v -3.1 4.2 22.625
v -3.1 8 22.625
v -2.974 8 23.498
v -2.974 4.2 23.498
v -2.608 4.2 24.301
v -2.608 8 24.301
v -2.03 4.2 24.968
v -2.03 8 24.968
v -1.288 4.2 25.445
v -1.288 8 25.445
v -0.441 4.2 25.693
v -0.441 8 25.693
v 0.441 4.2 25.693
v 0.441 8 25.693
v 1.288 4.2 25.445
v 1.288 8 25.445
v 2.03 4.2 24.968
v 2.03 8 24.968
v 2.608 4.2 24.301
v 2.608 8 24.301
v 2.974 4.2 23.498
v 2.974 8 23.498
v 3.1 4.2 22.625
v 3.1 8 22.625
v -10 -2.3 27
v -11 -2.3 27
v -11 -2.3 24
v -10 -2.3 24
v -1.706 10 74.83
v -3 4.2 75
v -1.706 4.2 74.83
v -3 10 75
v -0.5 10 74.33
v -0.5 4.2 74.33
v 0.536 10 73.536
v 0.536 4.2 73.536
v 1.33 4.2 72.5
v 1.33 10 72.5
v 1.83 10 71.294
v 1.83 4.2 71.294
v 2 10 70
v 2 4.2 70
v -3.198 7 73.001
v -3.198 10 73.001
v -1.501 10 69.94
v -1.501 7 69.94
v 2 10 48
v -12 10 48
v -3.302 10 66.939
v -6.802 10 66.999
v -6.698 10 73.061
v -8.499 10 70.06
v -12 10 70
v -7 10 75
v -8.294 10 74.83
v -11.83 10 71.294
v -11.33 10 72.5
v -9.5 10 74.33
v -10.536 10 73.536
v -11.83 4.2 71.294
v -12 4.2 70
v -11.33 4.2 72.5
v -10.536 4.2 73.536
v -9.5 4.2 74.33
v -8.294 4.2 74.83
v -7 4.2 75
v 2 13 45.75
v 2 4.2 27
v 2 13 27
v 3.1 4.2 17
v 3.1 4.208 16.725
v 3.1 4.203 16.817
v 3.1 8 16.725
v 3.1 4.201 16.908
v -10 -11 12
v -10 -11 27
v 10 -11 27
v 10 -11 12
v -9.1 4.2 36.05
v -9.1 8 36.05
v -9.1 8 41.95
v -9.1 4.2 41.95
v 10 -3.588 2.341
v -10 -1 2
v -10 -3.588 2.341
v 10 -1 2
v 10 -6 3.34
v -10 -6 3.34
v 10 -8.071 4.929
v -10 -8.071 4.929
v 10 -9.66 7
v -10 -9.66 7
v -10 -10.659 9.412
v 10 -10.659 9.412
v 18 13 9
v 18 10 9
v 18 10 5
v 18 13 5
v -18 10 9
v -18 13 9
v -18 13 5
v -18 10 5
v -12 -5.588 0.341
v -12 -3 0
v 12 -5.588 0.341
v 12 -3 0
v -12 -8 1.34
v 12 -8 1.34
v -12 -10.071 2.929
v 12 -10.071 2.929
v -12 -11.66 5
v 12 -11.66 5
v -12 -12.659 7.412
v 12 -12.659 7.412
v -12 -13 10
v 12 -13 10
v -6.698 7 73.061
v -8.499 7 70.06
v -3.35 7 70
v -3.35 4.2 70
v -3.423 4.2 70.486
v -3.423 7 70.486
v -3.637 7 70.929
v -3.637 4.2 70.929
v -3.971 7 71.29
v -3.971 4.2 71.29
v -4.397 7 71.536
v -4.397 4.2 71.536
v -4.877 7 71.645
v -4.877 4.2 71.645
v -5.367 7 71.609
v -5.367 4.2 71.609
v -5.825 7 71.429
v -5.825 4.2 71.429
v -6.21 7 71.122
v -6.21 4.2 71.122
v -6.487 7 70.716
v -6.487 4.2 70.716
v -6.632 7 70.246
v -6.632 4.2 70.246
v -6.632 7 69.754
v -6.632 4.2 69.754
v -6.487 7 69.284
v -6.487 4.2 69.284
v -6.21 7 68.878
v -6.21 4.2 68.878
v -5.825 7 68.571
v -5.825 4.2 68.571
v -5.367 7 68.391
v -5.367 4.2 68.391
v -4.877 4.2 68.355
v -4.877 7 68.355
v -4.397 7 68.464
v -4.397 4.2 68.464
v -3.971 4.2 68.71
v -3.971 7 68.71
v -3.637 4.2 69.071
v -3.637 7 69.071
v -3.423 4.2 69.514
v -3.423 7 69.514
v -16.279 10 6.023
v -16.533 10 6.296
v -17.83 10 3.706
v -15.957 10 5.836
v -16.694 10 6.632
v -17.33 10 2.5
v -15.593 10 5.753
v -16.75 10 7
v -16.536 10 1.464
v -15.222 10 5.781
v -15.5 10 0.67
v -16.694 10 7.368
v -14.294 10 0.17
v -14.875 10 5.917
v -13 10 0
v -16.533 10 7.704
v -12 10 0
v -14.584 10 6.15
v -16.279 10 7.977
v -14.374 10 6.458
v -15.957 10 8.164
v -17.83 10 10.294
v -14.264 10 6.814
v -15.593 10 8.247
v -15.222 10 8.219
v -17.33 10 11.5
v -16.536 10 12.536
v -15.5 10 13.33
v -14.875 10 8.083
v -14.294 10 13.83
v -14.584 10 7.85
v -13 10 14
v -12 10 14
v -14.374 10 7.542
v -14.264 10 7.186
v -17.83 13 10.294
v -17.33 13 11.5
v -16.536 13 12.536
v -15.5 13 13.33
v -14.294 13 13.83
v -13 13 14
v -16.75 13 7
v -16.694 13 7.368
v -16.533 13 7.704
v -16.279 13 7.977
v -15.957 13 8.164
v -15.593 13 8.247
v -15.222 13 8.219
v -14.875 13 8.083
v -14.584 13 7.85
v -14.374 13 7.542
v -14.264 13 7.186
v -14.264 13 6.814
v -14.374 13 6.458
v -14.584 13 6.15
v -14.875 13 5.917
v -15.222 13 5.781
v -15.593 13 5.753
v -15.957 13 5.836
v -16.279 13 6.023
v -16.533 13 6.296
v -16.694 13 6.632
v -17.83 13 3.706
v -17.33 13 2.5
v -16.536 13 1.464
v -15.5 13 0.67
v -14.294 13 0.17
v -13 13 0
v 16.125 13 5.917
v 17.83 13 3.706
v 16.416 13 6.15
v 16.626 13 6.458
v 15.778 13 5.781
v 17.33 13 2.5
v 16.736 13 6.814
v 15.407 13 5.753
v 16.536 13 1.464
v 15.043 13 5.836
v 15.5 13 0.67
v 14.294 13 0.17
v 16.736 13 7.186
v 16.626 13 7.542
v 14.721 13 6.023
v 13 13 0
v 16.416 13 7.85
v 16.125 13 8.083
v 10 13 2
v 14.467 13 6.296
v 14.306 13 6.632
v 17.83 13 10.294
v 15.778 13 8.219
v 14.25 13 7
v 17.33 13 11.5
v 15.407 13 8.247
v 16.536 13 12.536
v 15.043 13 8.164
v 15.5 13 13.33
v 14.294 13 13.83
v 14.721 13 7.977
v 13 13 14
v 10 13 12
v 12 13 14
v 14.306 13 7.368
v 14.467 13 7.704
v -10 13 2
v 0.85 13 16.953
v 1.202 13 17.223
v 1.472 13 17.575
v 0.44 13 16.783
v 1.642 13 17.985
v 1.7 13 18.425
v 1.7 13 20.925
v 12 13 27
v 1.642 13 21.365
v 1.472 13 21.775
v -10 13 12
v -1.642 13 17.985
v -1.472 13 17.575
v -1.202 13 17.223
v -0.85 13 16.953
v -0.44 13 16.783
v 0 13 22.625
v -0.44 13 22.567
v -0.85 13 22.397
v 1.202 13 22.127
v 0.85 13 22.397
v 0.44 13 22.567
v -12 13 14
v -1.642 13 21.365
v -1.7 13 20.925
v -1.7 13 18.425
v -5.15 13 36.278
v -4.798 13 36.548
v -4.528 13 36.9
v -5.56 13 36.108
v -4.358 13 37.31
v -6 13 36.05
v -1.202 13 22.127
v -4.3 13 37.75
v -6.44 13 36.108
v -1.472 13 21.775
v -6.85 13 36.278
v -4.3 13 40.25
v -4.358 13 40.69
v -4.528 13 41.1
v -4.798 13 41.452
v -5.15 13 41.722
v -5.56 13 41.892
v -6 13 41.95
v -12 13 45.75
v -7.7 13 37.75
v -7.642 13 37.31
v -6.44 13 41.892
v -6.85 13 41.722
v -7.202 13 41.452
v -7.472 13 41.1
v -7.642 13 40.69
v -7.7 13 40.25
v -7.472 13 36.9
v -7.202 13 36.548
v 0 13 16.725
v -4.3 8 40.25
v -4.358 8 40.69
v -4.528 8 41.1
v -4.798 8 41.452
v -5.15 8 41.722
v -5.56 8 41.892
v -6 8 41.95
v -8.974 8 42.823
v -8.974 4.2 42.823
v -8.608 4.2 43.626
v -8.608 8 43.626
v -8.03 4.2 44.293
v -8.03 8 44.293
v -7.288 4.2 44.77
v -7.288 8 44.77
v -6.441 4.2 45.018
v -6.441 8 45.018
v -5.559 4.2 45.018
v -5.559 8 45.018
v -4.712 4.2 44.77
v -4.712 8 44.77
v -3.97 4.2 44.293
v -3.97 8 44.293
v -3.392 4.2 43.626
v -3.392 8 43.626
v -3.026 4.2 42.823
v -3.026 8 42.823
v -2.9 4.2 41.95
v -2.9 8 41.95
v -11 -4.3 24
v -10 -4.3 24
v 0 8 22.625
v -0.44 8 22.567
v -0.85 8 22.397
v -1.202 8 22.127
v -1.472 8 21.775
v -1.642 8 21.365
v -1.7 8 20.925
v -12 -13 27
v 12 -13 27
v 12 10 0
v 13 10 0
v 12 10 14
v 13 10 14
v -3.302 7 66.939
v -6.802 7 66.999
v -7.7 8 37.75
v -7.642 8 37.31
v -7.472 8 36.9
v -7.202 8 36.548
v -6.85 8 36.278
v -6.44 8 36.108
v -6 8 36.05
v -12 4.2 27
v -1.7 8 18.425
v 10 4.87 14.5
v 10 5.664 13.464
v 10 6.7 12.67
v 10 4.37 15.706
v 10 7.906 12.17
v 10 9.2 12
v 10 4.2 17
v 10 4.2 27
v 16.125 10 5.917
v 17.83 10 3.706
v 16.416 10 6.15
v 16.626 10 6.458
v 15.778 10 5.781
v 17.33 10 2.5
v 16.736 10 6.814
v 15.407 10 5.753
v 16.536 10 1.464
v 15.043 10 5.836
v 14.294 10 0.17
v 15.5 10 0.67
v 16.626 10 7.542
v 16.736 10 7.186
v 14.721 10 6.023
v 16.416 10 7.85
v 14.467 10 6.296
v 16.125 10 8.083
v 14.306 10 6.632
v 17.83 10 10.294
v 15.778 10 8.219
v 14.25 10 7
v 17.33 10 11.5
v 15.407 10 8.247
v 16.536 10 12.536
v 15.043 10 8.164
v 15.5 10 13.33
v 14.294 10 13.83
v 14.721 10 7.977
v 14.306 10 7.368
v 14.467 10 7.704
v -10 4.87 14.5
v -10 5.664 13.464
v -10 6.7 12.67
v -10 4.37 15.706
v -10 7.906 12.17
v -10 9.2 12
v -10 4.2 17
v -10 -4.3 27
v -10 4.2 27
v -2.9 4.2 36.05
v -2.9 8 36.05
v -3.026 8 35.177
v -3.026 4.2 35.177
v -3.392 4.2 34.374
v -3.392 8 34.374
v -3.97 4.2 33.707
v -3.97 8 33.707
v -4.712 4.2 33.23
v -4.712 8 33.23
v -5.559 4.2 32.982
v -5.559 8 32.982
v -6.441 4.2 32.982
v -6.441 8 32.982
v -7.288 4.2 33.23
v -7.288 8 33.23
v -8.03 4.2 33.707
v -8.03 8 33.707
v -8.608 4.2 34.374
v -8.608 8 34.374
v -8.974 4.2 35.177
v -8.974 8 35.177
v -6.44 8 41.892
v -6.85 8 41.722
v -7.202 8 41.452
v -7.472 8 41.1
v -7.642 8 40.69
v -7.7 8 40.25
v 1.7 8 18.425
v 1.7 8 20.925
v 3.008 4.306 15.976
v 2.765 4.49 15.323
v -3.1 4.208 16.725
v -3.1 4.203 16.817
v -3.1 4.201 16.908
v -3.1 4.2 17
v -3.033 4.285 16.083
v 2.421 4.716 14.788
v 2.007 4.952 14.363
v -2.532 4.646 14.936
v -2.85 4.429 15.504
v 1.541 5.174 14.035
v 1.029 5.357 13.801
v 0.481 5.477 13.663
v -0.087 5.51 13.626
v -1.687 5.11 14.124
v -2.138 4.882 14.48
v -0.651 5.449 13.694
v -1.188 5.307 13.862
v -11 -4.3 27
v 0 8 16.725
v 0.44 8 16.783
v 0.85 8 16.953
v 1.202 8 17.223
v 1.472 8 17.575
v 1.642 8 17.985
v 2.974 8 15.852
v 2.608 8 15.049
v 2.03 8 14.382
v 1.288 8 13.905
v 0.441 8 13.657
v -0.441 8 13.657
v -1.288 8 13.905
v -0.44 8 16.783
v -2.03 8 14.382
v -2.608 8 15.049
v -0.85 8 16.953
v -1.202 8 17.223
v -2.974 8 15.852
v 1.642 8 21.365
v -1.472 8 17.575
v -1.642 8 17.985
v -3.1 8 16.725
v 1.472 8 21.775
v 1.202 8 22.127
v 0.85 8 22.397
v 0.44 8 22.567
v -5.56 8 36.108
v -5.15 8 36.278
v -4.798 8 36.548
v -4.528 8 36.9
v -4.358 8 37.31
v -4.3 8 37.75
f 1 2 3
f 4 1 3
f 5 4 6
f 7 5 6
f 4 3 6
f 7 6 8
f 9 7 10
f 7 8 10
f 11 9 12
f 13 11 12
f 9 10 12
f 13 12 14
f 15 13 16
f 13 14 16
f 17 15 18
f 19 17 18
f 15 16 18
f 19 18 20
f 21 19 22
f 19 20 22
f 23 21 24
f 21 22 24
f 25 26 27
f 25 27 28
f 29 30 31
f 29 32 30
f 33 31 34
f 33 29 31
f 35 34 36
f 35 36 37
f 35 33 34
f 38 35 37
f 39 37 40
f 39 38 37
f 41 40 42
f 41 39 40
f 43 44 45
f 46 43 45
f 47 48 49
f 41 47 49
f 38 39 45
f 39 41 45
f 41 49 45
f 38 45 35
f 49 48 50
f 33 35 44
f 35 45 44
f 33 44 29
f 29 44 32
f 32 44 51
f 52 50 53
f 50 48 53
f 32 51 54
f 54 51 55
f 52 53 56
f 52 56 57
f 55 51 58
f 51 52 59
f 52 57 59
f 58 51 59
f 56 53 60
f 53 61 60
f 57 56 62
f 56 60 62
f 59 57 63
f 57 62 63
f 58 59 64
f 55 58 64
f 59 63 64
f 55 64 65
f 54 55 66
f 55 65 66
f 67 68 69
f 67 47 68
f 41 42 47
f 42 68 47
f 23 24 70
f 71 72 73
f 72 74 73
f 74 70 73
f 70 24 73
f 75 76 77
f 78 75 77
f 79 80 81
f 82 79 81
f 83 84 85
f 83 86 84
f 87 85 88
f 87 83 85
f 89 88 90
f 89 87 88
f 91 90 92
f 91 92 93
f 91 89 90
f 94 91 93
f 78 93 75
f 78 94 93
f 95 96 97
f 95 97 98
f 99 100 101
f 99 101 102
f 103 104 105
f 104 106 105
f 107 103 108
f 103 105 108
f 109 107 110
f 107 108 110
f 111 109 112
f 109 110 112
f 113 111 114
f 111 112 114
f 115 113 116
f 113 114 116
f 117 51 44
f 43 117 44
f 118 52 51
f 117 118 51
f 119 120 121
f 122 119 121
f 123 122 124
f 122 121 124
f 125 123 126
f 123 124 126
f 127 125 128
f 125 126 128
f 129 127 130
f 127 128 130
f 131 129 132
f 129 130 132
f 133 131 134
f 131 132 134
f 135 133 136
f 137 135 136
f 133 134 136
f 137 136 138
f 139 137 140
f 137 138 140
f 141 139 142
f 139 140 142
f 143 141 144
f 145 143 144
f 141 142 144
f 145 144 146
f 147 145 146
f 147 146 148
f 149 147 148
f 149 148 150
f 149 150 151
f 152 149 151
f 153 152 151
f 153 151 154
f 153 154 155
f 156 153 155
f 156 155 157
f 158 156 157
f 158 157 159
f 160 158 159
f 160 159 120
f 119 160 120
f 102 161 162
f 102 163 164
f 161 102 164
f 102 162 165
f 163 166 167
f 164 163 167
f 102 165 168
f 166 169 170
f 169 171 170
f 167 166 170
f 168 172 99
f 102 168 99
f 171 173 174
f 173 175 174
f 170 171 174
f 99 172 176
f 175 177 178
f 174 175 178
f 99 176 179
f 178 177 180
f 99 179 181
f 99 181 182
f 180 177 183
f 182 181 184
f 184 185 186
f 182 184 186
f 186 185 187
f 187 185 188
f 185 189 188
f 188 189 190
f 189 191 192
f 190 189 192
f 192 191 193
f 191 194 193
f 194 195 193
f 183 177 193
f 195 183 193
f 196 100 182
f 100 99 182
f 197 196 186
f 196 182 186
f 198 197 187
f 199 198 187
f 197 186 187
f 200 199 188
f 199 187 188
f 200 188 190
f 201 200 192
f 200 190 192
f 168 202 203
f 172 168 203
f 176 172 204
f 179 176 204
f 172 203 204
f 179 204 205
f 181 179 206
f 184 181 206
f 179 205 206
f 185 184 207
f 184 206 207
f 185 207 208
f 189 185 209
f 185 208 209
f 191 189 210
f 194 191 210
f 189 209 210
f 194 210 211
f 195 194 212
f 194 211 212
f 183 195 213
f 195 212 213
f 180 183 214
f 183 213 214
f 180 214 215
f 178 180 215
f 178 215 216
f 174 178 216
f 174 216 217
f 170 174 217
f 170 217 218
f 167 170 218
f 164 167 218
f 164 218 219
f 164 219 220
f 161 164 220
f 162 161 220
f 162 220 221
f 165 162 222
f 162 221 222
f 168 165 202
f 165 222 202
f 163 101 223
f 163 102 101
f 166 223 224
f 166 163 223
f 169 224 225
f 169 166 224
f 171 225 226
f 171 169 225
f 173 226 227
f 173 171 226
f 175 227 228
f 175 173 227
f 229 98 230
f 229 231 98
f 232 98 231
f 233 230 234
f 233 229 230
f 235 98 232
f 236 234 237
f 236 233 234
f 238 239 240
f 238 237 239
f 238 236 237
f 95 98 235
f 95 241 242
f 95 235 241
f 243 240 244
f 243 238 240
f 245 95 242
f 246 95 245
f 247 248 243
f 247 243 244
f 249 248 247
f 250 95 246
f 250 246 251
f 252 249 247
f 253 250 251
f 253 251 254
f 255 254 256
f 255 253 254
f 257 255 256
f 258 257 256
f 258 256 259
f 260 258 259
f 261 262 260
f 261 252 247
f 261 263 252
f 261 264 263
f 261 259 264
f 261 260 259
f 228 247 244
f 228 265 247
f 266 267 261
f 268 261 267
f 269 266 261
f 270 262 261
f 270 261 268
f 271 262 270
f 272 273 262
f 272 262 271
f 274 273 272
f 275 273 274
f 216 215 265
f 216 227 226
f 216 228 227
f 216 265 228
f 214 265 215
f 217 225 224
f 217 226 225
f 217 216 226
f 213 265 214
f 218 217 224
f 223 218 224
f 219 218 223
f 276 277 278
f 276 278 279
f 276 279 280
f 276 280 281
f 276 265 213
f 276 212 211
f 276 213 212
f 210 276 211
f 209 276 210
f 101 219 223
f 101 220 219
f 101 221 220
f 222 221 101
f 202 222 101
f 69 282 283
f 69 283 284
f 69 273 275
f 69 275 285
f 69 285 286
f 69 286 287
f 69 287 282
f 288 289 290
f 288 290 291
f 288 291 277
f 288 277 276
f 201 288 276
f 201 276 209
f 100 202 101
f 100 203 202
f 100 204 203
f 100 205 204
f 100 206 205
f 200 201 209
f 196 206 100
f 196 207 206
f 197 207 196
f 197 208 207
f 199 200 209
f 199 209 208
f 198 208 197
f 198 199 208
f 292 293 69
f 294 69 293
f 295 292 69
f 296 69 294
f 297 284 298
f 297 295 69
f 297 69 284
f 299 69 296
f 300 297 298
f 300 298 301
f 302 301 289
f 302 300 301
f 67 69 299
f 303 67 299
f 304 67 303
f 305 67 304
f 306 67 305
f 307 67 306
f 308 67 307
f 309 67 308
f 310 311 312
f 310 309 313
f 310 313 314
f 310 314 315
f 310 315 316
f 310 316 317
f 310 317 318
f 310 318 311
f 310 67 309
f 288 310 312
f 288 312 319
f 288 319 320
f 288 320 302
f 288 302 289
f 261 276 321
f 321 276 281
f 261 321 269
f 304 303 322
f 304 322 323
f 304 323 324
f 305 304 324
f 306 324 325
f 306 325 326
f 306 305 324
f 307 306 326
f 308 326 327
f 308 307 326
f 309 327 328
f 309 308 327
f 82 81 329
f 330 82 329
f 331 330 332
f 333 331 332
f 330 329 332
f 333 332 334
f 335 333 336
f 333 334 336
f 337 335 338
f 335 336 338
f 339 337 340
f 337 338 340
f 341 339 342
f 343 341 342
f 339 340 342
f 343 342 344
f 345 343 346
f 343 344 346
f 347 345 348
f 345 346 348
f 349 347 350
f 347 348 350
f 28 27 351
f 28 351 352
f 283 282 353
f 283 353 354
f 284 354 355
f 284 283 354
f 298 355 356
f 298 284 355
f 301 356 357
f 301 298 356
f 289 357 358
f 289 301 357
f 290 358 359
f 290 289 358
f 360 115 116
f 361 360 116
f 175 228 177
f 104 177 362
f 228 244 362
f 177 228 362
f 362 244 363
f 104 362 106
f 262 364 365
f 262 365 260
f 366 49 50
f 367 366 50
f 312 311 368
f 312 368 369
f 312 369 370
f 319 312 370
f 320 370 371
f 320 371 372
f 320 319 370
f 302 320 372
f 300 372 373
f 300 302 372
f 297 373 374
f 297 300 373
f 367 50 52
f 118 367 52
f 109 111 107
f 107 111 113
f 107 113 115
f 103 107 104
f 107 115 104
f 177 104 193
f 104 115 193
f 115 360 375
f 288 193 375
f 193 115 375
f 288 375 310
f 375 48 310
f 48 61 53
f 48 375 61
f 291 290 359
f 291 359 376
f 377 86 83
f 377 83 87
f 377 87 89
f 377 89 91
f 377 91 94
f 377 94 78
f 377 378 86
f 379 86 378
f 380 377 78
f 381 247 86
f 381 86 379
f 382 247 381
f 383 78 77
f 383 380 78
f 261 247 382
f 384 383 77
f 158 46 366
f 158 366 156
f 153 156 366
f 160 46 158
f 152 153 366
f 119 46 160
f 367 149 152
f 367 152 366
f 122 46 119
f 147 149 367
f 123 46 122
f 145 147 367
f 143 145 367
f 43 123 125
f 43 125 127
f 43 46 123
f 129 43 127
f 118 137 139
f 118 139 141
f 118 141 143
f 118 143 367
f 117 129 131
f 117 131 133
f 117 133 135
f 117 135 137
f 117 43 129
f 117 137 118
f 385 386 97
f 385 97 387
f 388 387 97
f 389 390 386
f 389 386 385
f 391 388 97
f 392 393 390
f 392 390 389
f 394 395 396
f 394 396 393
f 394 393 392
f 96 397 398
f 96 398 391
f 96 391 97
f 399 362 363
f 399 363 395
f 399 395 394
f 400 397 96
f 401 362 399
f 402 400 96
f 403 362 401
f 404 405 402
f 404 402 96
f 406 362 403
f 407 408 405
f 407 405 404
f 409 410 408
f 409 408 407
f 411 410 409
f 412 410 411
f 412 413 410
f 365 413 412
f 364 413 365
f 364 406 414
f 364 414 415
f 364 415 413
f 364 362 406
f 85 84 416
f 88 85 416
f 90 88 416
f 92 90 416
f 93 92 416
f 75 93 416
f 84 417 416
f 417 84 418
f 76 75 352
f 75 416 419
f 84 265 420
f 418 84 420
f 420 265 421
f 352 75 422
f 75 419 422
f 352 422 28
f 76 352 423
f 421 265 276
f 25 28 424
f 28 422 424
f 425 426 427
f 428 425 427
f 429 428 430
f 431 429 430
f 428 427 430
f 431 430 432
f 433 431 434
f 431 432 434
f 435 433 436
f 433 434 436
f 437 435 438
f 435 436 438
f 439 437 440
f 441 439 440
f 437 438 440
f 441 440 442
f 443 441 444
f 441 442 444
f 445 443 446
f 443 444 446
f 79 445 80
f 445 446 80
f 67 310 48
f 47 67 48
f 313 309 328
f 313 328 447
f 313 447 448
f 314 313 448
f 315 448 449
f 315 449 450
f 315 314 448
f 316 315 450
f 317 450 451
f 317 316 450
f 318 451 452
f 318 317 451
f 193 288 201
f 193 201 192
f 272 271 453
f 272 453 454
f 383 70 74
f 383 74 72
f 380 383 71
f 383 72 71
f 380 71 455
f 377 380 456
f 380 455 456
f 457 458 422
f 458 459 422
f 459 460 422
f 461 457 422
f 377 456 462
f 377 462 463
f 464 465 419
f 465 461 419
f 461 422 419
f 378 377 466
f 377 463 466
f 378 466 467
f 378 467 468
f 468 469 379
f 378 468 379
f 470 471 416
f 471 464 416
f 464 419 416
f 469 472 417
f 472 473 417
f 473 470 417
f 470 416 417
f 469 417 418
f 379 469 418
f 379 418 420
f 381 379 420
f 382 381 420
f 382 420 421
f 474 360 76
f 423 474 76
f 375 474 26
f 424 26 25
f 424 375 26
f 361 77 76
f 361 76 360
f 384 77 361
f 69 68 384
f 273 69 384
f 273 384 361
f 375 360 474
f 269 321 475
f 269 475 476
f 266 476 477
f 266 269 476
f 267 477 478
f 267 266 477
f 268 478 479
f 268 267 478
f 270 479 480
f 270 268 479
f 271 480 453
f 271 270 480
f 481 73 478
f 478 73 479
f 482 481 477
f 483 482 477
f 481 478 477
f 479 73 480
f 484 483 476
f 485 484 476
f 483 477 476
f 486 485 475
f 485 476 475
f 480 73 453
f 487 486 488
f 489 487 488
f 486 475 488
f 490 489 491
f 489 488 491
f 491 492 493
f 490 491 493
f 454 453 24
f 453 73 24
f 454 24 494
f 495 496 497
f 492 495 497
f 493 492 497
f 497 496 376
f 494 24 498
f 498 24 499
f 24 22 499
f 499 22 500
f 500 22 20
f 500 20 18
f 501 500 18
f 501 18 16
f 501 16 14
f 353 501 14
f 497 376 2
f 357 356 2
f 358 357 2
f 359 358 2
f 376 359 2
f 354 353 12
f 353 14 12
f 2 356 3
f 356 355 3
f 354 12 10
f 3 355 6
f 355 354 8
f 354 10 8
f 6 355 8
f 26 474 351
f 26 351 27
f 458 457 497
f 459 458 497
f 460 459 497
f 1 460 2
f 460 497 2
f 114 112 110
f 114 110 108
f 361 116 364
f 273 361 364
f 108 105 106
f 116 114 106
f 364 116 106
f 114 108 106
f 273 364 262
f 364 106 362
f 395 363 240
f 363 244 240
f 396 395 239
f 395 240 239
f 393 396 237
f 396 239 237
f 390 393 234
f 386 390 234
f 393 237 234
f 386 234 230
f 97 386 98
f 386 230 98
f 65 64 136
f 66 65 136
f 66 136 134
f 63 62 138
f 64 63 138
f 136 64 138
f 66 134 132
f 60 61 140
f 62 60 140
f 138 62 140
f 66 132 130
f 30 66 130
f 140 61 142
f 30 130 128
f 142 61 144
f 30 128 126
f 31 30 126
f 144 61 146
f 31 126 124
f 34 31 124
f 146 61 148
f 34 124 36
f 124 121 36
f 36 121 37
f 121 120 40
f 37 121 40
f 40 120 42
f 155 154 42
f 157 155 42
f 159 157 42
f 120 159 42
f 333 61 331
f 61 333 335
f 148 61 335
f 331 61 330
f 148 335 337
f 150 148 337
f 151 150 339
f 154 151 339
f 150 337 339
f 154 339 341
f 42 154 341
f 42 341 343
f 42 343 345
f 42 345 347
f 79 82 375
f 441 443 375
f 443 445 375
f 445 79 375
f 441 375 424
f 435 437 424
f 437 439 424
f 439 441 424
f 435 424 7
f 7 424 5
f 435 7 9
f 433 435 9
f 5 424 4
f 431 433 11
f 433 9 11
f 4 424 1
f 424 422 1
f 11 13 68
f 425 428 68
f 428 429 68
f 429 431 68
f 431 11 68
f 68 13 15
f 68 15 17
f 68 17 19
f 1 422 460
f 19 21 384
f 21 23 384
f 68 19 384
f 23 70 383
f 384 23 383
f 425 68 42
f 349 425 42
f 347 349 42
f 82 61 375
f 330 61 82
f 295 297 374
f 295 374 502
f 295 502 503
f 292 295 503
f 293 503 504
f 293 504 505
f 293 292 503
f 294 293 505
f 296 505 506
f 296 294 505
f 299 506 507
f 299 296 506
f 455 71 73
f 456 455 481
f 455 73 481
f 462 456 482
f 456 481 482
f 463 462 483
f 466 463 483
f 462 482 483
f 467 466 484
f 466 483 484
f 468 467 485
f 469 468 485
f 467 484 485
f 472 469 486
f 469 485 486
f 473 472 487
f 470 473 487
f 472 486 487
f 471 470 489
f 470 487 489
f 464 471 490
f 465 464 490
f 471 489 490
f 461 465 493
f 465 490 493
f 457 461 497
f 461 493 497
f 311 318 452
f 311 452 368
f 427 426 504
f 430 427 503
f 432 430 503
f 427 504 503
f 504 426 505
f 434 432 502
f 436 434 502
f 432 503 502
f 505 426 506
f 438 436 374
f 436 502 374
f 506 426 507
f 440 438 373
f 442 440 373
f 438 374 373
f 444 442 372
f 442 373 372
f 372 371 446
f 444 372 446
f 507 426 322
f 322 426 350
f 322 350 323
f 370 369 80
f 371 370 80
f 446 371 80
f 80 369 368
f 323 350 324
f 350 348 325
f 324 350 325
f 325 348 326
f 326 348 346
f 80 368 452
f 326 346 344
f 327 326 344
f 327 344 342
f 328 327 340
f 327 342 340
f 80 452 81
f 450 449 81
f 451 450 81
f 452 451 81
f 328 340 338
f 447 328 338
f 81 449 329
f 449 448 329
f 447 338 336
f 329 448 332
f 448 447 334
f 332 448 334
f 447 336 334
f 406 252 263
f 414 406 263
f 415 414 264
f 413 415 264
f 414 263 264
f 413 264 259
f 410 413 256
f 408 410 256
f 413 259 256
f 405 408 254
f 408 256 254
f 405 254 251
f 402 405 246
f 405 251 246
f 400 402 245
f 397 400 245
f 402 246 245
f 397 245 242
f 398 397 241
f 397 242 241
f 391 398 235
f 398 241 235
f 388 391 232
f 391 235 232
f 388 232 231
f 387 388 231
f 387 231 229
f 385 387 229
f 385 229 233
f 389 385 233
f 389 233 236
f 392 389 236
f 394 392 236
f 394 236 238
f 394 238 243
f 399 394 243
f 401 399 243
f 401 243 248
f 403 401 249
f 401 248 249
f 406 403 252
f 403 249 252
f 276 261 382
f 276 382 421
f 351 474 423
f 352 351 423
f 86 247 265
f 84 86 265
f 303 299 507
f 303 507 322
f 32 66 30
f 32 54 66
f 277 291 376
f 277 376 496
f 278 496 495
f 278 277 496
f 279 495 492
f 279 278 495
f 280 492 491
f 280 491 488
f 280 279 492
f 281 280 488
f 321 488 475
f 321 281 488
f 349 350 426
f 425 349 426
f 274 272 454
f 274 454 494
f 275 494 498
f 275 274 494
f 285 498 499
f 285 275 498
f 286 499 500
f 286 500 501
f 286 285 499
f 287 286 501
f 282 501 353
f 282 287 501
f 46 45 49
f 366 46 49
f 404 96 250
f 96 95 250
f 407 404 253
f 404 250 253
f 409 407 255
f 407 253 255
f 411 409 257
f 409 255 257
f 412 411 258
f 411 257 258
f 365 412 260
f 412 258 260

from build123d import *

# Parameters (mm, degrees)
F0_W         = 24
F0_H         = 26
F1_DEPTH     = 27
F2_W         = 20
F2_H         = 15.2
F3_DEPTH     = 25
F4_W         = 20
F4_H         = 10
F5_DEPTH     = 24
F7_W         = 3
F7_H         = 14
F8_DEPTH     = 6
F6_W         = 3
F6_H         = 14
F9_DEPTH     = 6
F10_R        = 1.25
F11_DEPTH    = 3
F12_R        = 5
F14_DEPTH    = 48
F15_W        = 3
F15_H        = 30
F16_DEPTH    = 14
F17_T4_DEPTH = 14
F18_R        = 1.65
F19_DEPTH    = 5.8
F21_DEPTH    = 3
F23_DEPTH    = 8.8
F24_DEPTH    = 5
F25_R        = 10
F26_T1_DEPTH = 20
F27_W        = 1
F27_H        = 2
F28_DEPTH    = 3
F29_R        = 5


# Not quite as in the source:
# - a fillet or chamfer that OpenCascade refuses, or shapes differently, is made with other operations: its cross-section is extruded or revolved along the edge and cut away or added


with BuildPart() as f1:
    # F0 (on Top) → F1 (new body)
    with BuildSketch(Plane.XY):
        Rectangle(F0_W, F0_H)
    extrude(amount=F1_DEPTH)

    # F2 (on face) → F3 (cut)
    with BuildSketch(Plane.XY.offset(27)):
        with Locations((0, -3.4)):
            Rectangle(F2_W, F2_H)
    extrude(amount=-F3_DEPTH, mode=Mode.SUBTRACT)

    # F4 (on face) → F5 (cut, through all)
    with BuildSketch(Plane(origin=(0, 13, 0), x_dir=(-1, 0, 0), z_dir=(0, 1, 0))):
        with Locations((0, 7)):
            Rectangle(F4_W, F4_H)
    extrude(amount=-F5_DEPTH, mode=Mode.SUBTRACT)

    # F7 (on face) → F8 (join)
    with BuildSketch(Plane.YZ.offset(12)):
        with Locations((11.5, 7)):
            Rectangle(F7_W, F7_H)
    extrude(amount=F8_DEPTH)

    # F6 (on face) → F9 (join)
    with BuildSketch(Plane(origin=(-12, 0, 0), x_dir=(0, -1, 0), z_dir=(-1, 0, 0))):
        with Locations((-11.5, 7)):
            Rectangle(F6_W, F6_H)
    extrude(amount=F9_DEPTH)

    # F10 (on face) → F11 (cut, through all)
    with BuildSketch(Plane(origin=(0, 13, 0), x_dir=(-1, 0, 0), z_dir=(0, 1, 0))):
        with Locations((-15.5, 7)):
            Circle(F10_R)
        with Locations((15.5, 7)):
            Circle(F10_R)
    extrude(amount=-F11_DEPTH, mode=Mode.SUBTRACT)

    # F12
    f12_edges = [f1.edges().sort_by_distance(p)[0] for p in [
        (18, 11.5, 14),
        (18, 11.5, 0),
        (-18, 11.5, 14),
        (-18, 11.5, 0),
    ]]
    fillet(f12_edges, radius=F12_R)

    # F13 (on face) → F14 (join)
    with BuildSketch(Plane.XY.offset(27)):
        Polygon((2, 13), (-12, 13), (-12, 4.2), (-10, 4.2), (2, 4.2), align=None)
    extrude(amount=F14_DEPTH)

    # F15 (on face) → F16 (cut, through all)
    with BuildSketch(Plane(origin=(-12, 0, 0), x_dir=(0, -1, 0), z_dir=(-1, 0, 0))):
        with Locations((-11.5, 60)):
            Rectangle(F15_W, F15_H)
    extrude(amount=-F16_DEPTH, mode=Mode.SUBTRACT)

    # F17: chamfer of 3 x 4 on 1 edges, made by hand


with BuildPart() as f17_tool2:
    # F17_s3 → F17_t4 (new body)
    with BuildSketch(Plane.YZ.offset(-12)):
        Polygon((14, 45), (10, 48), (10, 45), align=None)
    extrude(amount=F17_T4_DEPTH)

    split(bisect_by=Plane.XZ.offset(-13), keep=Keep.TOP)


with BuildPart() as f1_1:
    add(f1.part)

    # F17_t1: union F17_tool2
    add(f17_tool2.part)

    # F18 (on face) → F19 (cut, through all)
    with BuildSketch(Plane.XZ.offset(-4.2)):
        with Locations((-5, 70)):
            Circle(F18_R)
    extrude(amount=-F19_DEPTH, mode=Mode.SUBTRACT)

    # F20 (on face) → F21 (cut)
    with BuildSketch(Plane(origin=(0, 10, 0), x_dir=(-1, 0, 0), z_dir=(0, 1, 0))):
        Polygon((8.4994896827, 70.0597658786), (6.6979860722, 73.0605299049), (3.1984963894, 73.0007640263), (1.5005103171, 69.9402341215), (3.3020139276, 66.9394700952), (6.8015036104, 66.9992359738), align=None)
    extrude(amount=-F21_DEPTH, mode=Mode.SUBTRACT)

    # F22 (on face) → F23 (cut, through all)
    with BuildSketch(Plane(origin=(0, 13, 0), x_dir=(-1, 0, 0), z_dir=(0, 1, 0))):
        with BuildLine():
            ThreePointArc((3.1, 22.625), (0, 25.725), (-3.1, 22.625))
            Line((-3.1, 22.625), (-3.1, 16.725))
            ThreePointArc((-3.1, 16.725), (0, 13.625), (3.1, 16.725))
            Line((3.1, 16.725), (3.1, 22.625))
        make_face()
        with BuildLine():
            Line((1.7, 20.925), (1.7, 18.425))
            ThreePointArc((1.7, 18.425), (1.202081528, 17.222918472), (0, 16.725))
            ThreePointArc((0, 16.725), (-1.202081528, 17.222918472), (-1.7, 18.425))
            Line((-1.7, 18.425), (-1.7, 20.925))
            ThreePointArc((-1.7, 20.925), (-1.202081528, 22.127081528), (0, 22.625))
            ThreePointArc((0, 22.625), (1.202081528, 22.127081528), (1.7, 20.925))
        make_face(mode=Mode.SUBTRACT)
        with BuildLine():
            ThreePointArc((9.1, 41.95), (6, 45.05), (2.9, 41.95))
            Line((2.9, 41.95), (2.9, 36.05))
            ThreePointArc((2.9, 36.05), (6, 32.95), (9.1, 36.05))
            Line((9.1, 36.05), (9.1, 41.95))
        make_face()
        with BuildLine():
            ThreePointArc((4.3, 40.25), (4.797918472, 41.452081528), (6, 41.95))
            ThreePointArc((6, 41.95), (7.202081528, 41.452081528), (7.7, 40.25))
            Line((7.7, 40.25), (7.7, 37.75))
            ThreePointArc((7.7, 37.75), (7.202081528, 36.547918472), (6, 36.05))
            ThreePointArc((6, 36.05), (4.797918472, 36.547918472), (4.3, 37.75))
            Line((4.3, 37.75), (4.3, 40.25))
        make_face(mode=Mode.SUBTRACT)
        with BuildLine():
            ThreePointArc((-1.7, 18.425), (-1.202081528, 17.222918472), (0, 16.725))
            Line((0, 16.725), (0, 22.625))
            ThreePointArc((0, 22.625), (-1.202081528, 22.127081528), (-1.7, 20.925))
            Line((-1.7, 20.925), (-1.7, 18.425))
        make_face()
        with BuildLine():
            ThreePointArc((0, 16.725), (1.202081528, 17.222918472), (1.7, 18.425))
            Line((1.7, 18.425), (1.7, 20.925))
            ThreePointArc((1.7, 20.925), (1.202081528, 22.127081528), (0, 22.625))
            Line((0, 22.625), (0, 16.725))
        make_face()
        with BuildLine():
            Line((6, 41.95), (6, 40.25))
            Line((6, 40.25), (6, 37.75))
            Line((6, 37.75), (6, 36.05))
            ThreePointArc((6, 36.05), (7.202081528, 36.547918472), (7.7, 37.75))
            Line((7.7, 37.75), (7.7, 40.25))
            ThreePointArc((7.7, 40.25), (7.202081528, 41.452081528), (6, 41.95))
        make_face()
        with BuildLine():
            Line((6, 37.75), (6, 40.25))
            Line((6, 40.25), (6, 41.95))
            ThreePointArc((6, 41.95), (4.797918472, 41.452081528), (4.3, 40.25))
            Line((4.3, 40.25), (4.3, 37.75))
            ThreePointArc((4.3, 37.75), (4.797918472, 36.547918472), (6, 36.05))
            Line((6, 36.05), (6, 37.75))
        make_face()
    extrude(amount=-F23_DEPTH, mode=Mode.SUBTRACT)

    # F22 (on face) → F24 (join)
    with BuildSketch(Plane(origin=(0, 13, 0), x_dir=(-1, 0, 0), z_dir=(0, 1, 0))):
        with BuildLine():
            ThreePointArc((3.1, 22.625), (0, 25.725), (-3.1, 22.625))
            Line((-3.1, 22.625), (-3.1, 16.725))
            ThreePointArc((-3.1, 16.725), (0, 13.625), (3.1, 16.725))
            Line((3.1, 16.725), (3.1, 22.625))
        make_face()
        with BuildLine():
            Line((1.7, 20.925), (1.7, 18.425))
            ThreePointArc((1.7, 18.425), (1.202081528, 17.222918472), (0, 16.725))
            ThreePointArc((0, 16.725), (-1.202081528, 17.222918472), (-1.7, 18.425))
            Line((-1.7, 18.425), (-1.7, 20.925))
            ThreePointArc((-1.7, 20.925), (-1.202081528, 22.127081528), (0, 22.625))
            ThreePointArc((0, 22.625), (1.202081528, 22.127081528), (1.7, 20.925))
        make_face(mode=Mode.SUBTRACT)
        with BuildLine():
            ThreePointArc((9.1, 41.95), (6, 45.05), (2.9, 41.95))
            Line((2.9, 41.95), (2.9, 36.05))
            ThreePointArc((2.9, 36.05), (6, 32.95), (9.1, 36.05))
            Line((9.1, 36.05), (9.1, 41.95))
        make_face()
        with BuildLine():
            ThreePointArc((4.3, 40.25), (4.797918472, 41.452081528), (6, 41.95))
            ThreePointArc((6, 41.95), (7.202081528, 41.452081528), (7.7, 40.25))
            Line((7.7, 40.25), (7.7, 37.75))
            ThreePointArc((7.7, 37.75), (7.202081528, 36.547918472), (6, 36.05))
            ThreePointArc((6, 36.05), (4.797918472, 36.547918472), (4.3, 37.75))
            Line((4.3, 37.75), (4.3, 40.25))
        make_face(mode=Mode.SUBTRACT)
    extrude(amount=-F24_DEPTH)

    # F25
    f25_edges = [f1_1.edges().sort_by_distance(p)[0] for p in [
        (0, -13, 0),
        (0, -11, 2),
    ]]
    fillet(f25_edges, radius=F25_R)

    # F26: fillet of radius 5 on 1 edges, made by hand

    # F26_s2 → F26_t1 (cut)
    with BuildSketch(Plane.YZ.offset(-10)):
        with BuildLine():
            ThreePointArc((4.2, 17), (5.6644660941, 13.4644660941), (9.2, 12))
            Line((9.2, 12), (4.2, 12))
            Line((4.2, 12), (4.2, 17))
        make_face()
    extrude(amount=F26_T1_DEPTH, mode=Mode.SUBTRACT)

    # F27 (on face) → F28 (cut)
    with BuildSketch(Plane.XY.offset(27)):
        with Locations((-10.5, -3.3)):
            Rectangle(F27_W, F27_H)
    extrude(amount=-F28_DEPTH, mode=Mode.SUBTRACT)

    # F29
    f29_edges = [f1_1.edges().sort_by_distance(p)[0] for p in [
        (-12, 7.1, 75),
        (2, 7.1, 75),
    ]]
    fillet(f29_edges, radius=F29_R)


solid = f1_1.part
